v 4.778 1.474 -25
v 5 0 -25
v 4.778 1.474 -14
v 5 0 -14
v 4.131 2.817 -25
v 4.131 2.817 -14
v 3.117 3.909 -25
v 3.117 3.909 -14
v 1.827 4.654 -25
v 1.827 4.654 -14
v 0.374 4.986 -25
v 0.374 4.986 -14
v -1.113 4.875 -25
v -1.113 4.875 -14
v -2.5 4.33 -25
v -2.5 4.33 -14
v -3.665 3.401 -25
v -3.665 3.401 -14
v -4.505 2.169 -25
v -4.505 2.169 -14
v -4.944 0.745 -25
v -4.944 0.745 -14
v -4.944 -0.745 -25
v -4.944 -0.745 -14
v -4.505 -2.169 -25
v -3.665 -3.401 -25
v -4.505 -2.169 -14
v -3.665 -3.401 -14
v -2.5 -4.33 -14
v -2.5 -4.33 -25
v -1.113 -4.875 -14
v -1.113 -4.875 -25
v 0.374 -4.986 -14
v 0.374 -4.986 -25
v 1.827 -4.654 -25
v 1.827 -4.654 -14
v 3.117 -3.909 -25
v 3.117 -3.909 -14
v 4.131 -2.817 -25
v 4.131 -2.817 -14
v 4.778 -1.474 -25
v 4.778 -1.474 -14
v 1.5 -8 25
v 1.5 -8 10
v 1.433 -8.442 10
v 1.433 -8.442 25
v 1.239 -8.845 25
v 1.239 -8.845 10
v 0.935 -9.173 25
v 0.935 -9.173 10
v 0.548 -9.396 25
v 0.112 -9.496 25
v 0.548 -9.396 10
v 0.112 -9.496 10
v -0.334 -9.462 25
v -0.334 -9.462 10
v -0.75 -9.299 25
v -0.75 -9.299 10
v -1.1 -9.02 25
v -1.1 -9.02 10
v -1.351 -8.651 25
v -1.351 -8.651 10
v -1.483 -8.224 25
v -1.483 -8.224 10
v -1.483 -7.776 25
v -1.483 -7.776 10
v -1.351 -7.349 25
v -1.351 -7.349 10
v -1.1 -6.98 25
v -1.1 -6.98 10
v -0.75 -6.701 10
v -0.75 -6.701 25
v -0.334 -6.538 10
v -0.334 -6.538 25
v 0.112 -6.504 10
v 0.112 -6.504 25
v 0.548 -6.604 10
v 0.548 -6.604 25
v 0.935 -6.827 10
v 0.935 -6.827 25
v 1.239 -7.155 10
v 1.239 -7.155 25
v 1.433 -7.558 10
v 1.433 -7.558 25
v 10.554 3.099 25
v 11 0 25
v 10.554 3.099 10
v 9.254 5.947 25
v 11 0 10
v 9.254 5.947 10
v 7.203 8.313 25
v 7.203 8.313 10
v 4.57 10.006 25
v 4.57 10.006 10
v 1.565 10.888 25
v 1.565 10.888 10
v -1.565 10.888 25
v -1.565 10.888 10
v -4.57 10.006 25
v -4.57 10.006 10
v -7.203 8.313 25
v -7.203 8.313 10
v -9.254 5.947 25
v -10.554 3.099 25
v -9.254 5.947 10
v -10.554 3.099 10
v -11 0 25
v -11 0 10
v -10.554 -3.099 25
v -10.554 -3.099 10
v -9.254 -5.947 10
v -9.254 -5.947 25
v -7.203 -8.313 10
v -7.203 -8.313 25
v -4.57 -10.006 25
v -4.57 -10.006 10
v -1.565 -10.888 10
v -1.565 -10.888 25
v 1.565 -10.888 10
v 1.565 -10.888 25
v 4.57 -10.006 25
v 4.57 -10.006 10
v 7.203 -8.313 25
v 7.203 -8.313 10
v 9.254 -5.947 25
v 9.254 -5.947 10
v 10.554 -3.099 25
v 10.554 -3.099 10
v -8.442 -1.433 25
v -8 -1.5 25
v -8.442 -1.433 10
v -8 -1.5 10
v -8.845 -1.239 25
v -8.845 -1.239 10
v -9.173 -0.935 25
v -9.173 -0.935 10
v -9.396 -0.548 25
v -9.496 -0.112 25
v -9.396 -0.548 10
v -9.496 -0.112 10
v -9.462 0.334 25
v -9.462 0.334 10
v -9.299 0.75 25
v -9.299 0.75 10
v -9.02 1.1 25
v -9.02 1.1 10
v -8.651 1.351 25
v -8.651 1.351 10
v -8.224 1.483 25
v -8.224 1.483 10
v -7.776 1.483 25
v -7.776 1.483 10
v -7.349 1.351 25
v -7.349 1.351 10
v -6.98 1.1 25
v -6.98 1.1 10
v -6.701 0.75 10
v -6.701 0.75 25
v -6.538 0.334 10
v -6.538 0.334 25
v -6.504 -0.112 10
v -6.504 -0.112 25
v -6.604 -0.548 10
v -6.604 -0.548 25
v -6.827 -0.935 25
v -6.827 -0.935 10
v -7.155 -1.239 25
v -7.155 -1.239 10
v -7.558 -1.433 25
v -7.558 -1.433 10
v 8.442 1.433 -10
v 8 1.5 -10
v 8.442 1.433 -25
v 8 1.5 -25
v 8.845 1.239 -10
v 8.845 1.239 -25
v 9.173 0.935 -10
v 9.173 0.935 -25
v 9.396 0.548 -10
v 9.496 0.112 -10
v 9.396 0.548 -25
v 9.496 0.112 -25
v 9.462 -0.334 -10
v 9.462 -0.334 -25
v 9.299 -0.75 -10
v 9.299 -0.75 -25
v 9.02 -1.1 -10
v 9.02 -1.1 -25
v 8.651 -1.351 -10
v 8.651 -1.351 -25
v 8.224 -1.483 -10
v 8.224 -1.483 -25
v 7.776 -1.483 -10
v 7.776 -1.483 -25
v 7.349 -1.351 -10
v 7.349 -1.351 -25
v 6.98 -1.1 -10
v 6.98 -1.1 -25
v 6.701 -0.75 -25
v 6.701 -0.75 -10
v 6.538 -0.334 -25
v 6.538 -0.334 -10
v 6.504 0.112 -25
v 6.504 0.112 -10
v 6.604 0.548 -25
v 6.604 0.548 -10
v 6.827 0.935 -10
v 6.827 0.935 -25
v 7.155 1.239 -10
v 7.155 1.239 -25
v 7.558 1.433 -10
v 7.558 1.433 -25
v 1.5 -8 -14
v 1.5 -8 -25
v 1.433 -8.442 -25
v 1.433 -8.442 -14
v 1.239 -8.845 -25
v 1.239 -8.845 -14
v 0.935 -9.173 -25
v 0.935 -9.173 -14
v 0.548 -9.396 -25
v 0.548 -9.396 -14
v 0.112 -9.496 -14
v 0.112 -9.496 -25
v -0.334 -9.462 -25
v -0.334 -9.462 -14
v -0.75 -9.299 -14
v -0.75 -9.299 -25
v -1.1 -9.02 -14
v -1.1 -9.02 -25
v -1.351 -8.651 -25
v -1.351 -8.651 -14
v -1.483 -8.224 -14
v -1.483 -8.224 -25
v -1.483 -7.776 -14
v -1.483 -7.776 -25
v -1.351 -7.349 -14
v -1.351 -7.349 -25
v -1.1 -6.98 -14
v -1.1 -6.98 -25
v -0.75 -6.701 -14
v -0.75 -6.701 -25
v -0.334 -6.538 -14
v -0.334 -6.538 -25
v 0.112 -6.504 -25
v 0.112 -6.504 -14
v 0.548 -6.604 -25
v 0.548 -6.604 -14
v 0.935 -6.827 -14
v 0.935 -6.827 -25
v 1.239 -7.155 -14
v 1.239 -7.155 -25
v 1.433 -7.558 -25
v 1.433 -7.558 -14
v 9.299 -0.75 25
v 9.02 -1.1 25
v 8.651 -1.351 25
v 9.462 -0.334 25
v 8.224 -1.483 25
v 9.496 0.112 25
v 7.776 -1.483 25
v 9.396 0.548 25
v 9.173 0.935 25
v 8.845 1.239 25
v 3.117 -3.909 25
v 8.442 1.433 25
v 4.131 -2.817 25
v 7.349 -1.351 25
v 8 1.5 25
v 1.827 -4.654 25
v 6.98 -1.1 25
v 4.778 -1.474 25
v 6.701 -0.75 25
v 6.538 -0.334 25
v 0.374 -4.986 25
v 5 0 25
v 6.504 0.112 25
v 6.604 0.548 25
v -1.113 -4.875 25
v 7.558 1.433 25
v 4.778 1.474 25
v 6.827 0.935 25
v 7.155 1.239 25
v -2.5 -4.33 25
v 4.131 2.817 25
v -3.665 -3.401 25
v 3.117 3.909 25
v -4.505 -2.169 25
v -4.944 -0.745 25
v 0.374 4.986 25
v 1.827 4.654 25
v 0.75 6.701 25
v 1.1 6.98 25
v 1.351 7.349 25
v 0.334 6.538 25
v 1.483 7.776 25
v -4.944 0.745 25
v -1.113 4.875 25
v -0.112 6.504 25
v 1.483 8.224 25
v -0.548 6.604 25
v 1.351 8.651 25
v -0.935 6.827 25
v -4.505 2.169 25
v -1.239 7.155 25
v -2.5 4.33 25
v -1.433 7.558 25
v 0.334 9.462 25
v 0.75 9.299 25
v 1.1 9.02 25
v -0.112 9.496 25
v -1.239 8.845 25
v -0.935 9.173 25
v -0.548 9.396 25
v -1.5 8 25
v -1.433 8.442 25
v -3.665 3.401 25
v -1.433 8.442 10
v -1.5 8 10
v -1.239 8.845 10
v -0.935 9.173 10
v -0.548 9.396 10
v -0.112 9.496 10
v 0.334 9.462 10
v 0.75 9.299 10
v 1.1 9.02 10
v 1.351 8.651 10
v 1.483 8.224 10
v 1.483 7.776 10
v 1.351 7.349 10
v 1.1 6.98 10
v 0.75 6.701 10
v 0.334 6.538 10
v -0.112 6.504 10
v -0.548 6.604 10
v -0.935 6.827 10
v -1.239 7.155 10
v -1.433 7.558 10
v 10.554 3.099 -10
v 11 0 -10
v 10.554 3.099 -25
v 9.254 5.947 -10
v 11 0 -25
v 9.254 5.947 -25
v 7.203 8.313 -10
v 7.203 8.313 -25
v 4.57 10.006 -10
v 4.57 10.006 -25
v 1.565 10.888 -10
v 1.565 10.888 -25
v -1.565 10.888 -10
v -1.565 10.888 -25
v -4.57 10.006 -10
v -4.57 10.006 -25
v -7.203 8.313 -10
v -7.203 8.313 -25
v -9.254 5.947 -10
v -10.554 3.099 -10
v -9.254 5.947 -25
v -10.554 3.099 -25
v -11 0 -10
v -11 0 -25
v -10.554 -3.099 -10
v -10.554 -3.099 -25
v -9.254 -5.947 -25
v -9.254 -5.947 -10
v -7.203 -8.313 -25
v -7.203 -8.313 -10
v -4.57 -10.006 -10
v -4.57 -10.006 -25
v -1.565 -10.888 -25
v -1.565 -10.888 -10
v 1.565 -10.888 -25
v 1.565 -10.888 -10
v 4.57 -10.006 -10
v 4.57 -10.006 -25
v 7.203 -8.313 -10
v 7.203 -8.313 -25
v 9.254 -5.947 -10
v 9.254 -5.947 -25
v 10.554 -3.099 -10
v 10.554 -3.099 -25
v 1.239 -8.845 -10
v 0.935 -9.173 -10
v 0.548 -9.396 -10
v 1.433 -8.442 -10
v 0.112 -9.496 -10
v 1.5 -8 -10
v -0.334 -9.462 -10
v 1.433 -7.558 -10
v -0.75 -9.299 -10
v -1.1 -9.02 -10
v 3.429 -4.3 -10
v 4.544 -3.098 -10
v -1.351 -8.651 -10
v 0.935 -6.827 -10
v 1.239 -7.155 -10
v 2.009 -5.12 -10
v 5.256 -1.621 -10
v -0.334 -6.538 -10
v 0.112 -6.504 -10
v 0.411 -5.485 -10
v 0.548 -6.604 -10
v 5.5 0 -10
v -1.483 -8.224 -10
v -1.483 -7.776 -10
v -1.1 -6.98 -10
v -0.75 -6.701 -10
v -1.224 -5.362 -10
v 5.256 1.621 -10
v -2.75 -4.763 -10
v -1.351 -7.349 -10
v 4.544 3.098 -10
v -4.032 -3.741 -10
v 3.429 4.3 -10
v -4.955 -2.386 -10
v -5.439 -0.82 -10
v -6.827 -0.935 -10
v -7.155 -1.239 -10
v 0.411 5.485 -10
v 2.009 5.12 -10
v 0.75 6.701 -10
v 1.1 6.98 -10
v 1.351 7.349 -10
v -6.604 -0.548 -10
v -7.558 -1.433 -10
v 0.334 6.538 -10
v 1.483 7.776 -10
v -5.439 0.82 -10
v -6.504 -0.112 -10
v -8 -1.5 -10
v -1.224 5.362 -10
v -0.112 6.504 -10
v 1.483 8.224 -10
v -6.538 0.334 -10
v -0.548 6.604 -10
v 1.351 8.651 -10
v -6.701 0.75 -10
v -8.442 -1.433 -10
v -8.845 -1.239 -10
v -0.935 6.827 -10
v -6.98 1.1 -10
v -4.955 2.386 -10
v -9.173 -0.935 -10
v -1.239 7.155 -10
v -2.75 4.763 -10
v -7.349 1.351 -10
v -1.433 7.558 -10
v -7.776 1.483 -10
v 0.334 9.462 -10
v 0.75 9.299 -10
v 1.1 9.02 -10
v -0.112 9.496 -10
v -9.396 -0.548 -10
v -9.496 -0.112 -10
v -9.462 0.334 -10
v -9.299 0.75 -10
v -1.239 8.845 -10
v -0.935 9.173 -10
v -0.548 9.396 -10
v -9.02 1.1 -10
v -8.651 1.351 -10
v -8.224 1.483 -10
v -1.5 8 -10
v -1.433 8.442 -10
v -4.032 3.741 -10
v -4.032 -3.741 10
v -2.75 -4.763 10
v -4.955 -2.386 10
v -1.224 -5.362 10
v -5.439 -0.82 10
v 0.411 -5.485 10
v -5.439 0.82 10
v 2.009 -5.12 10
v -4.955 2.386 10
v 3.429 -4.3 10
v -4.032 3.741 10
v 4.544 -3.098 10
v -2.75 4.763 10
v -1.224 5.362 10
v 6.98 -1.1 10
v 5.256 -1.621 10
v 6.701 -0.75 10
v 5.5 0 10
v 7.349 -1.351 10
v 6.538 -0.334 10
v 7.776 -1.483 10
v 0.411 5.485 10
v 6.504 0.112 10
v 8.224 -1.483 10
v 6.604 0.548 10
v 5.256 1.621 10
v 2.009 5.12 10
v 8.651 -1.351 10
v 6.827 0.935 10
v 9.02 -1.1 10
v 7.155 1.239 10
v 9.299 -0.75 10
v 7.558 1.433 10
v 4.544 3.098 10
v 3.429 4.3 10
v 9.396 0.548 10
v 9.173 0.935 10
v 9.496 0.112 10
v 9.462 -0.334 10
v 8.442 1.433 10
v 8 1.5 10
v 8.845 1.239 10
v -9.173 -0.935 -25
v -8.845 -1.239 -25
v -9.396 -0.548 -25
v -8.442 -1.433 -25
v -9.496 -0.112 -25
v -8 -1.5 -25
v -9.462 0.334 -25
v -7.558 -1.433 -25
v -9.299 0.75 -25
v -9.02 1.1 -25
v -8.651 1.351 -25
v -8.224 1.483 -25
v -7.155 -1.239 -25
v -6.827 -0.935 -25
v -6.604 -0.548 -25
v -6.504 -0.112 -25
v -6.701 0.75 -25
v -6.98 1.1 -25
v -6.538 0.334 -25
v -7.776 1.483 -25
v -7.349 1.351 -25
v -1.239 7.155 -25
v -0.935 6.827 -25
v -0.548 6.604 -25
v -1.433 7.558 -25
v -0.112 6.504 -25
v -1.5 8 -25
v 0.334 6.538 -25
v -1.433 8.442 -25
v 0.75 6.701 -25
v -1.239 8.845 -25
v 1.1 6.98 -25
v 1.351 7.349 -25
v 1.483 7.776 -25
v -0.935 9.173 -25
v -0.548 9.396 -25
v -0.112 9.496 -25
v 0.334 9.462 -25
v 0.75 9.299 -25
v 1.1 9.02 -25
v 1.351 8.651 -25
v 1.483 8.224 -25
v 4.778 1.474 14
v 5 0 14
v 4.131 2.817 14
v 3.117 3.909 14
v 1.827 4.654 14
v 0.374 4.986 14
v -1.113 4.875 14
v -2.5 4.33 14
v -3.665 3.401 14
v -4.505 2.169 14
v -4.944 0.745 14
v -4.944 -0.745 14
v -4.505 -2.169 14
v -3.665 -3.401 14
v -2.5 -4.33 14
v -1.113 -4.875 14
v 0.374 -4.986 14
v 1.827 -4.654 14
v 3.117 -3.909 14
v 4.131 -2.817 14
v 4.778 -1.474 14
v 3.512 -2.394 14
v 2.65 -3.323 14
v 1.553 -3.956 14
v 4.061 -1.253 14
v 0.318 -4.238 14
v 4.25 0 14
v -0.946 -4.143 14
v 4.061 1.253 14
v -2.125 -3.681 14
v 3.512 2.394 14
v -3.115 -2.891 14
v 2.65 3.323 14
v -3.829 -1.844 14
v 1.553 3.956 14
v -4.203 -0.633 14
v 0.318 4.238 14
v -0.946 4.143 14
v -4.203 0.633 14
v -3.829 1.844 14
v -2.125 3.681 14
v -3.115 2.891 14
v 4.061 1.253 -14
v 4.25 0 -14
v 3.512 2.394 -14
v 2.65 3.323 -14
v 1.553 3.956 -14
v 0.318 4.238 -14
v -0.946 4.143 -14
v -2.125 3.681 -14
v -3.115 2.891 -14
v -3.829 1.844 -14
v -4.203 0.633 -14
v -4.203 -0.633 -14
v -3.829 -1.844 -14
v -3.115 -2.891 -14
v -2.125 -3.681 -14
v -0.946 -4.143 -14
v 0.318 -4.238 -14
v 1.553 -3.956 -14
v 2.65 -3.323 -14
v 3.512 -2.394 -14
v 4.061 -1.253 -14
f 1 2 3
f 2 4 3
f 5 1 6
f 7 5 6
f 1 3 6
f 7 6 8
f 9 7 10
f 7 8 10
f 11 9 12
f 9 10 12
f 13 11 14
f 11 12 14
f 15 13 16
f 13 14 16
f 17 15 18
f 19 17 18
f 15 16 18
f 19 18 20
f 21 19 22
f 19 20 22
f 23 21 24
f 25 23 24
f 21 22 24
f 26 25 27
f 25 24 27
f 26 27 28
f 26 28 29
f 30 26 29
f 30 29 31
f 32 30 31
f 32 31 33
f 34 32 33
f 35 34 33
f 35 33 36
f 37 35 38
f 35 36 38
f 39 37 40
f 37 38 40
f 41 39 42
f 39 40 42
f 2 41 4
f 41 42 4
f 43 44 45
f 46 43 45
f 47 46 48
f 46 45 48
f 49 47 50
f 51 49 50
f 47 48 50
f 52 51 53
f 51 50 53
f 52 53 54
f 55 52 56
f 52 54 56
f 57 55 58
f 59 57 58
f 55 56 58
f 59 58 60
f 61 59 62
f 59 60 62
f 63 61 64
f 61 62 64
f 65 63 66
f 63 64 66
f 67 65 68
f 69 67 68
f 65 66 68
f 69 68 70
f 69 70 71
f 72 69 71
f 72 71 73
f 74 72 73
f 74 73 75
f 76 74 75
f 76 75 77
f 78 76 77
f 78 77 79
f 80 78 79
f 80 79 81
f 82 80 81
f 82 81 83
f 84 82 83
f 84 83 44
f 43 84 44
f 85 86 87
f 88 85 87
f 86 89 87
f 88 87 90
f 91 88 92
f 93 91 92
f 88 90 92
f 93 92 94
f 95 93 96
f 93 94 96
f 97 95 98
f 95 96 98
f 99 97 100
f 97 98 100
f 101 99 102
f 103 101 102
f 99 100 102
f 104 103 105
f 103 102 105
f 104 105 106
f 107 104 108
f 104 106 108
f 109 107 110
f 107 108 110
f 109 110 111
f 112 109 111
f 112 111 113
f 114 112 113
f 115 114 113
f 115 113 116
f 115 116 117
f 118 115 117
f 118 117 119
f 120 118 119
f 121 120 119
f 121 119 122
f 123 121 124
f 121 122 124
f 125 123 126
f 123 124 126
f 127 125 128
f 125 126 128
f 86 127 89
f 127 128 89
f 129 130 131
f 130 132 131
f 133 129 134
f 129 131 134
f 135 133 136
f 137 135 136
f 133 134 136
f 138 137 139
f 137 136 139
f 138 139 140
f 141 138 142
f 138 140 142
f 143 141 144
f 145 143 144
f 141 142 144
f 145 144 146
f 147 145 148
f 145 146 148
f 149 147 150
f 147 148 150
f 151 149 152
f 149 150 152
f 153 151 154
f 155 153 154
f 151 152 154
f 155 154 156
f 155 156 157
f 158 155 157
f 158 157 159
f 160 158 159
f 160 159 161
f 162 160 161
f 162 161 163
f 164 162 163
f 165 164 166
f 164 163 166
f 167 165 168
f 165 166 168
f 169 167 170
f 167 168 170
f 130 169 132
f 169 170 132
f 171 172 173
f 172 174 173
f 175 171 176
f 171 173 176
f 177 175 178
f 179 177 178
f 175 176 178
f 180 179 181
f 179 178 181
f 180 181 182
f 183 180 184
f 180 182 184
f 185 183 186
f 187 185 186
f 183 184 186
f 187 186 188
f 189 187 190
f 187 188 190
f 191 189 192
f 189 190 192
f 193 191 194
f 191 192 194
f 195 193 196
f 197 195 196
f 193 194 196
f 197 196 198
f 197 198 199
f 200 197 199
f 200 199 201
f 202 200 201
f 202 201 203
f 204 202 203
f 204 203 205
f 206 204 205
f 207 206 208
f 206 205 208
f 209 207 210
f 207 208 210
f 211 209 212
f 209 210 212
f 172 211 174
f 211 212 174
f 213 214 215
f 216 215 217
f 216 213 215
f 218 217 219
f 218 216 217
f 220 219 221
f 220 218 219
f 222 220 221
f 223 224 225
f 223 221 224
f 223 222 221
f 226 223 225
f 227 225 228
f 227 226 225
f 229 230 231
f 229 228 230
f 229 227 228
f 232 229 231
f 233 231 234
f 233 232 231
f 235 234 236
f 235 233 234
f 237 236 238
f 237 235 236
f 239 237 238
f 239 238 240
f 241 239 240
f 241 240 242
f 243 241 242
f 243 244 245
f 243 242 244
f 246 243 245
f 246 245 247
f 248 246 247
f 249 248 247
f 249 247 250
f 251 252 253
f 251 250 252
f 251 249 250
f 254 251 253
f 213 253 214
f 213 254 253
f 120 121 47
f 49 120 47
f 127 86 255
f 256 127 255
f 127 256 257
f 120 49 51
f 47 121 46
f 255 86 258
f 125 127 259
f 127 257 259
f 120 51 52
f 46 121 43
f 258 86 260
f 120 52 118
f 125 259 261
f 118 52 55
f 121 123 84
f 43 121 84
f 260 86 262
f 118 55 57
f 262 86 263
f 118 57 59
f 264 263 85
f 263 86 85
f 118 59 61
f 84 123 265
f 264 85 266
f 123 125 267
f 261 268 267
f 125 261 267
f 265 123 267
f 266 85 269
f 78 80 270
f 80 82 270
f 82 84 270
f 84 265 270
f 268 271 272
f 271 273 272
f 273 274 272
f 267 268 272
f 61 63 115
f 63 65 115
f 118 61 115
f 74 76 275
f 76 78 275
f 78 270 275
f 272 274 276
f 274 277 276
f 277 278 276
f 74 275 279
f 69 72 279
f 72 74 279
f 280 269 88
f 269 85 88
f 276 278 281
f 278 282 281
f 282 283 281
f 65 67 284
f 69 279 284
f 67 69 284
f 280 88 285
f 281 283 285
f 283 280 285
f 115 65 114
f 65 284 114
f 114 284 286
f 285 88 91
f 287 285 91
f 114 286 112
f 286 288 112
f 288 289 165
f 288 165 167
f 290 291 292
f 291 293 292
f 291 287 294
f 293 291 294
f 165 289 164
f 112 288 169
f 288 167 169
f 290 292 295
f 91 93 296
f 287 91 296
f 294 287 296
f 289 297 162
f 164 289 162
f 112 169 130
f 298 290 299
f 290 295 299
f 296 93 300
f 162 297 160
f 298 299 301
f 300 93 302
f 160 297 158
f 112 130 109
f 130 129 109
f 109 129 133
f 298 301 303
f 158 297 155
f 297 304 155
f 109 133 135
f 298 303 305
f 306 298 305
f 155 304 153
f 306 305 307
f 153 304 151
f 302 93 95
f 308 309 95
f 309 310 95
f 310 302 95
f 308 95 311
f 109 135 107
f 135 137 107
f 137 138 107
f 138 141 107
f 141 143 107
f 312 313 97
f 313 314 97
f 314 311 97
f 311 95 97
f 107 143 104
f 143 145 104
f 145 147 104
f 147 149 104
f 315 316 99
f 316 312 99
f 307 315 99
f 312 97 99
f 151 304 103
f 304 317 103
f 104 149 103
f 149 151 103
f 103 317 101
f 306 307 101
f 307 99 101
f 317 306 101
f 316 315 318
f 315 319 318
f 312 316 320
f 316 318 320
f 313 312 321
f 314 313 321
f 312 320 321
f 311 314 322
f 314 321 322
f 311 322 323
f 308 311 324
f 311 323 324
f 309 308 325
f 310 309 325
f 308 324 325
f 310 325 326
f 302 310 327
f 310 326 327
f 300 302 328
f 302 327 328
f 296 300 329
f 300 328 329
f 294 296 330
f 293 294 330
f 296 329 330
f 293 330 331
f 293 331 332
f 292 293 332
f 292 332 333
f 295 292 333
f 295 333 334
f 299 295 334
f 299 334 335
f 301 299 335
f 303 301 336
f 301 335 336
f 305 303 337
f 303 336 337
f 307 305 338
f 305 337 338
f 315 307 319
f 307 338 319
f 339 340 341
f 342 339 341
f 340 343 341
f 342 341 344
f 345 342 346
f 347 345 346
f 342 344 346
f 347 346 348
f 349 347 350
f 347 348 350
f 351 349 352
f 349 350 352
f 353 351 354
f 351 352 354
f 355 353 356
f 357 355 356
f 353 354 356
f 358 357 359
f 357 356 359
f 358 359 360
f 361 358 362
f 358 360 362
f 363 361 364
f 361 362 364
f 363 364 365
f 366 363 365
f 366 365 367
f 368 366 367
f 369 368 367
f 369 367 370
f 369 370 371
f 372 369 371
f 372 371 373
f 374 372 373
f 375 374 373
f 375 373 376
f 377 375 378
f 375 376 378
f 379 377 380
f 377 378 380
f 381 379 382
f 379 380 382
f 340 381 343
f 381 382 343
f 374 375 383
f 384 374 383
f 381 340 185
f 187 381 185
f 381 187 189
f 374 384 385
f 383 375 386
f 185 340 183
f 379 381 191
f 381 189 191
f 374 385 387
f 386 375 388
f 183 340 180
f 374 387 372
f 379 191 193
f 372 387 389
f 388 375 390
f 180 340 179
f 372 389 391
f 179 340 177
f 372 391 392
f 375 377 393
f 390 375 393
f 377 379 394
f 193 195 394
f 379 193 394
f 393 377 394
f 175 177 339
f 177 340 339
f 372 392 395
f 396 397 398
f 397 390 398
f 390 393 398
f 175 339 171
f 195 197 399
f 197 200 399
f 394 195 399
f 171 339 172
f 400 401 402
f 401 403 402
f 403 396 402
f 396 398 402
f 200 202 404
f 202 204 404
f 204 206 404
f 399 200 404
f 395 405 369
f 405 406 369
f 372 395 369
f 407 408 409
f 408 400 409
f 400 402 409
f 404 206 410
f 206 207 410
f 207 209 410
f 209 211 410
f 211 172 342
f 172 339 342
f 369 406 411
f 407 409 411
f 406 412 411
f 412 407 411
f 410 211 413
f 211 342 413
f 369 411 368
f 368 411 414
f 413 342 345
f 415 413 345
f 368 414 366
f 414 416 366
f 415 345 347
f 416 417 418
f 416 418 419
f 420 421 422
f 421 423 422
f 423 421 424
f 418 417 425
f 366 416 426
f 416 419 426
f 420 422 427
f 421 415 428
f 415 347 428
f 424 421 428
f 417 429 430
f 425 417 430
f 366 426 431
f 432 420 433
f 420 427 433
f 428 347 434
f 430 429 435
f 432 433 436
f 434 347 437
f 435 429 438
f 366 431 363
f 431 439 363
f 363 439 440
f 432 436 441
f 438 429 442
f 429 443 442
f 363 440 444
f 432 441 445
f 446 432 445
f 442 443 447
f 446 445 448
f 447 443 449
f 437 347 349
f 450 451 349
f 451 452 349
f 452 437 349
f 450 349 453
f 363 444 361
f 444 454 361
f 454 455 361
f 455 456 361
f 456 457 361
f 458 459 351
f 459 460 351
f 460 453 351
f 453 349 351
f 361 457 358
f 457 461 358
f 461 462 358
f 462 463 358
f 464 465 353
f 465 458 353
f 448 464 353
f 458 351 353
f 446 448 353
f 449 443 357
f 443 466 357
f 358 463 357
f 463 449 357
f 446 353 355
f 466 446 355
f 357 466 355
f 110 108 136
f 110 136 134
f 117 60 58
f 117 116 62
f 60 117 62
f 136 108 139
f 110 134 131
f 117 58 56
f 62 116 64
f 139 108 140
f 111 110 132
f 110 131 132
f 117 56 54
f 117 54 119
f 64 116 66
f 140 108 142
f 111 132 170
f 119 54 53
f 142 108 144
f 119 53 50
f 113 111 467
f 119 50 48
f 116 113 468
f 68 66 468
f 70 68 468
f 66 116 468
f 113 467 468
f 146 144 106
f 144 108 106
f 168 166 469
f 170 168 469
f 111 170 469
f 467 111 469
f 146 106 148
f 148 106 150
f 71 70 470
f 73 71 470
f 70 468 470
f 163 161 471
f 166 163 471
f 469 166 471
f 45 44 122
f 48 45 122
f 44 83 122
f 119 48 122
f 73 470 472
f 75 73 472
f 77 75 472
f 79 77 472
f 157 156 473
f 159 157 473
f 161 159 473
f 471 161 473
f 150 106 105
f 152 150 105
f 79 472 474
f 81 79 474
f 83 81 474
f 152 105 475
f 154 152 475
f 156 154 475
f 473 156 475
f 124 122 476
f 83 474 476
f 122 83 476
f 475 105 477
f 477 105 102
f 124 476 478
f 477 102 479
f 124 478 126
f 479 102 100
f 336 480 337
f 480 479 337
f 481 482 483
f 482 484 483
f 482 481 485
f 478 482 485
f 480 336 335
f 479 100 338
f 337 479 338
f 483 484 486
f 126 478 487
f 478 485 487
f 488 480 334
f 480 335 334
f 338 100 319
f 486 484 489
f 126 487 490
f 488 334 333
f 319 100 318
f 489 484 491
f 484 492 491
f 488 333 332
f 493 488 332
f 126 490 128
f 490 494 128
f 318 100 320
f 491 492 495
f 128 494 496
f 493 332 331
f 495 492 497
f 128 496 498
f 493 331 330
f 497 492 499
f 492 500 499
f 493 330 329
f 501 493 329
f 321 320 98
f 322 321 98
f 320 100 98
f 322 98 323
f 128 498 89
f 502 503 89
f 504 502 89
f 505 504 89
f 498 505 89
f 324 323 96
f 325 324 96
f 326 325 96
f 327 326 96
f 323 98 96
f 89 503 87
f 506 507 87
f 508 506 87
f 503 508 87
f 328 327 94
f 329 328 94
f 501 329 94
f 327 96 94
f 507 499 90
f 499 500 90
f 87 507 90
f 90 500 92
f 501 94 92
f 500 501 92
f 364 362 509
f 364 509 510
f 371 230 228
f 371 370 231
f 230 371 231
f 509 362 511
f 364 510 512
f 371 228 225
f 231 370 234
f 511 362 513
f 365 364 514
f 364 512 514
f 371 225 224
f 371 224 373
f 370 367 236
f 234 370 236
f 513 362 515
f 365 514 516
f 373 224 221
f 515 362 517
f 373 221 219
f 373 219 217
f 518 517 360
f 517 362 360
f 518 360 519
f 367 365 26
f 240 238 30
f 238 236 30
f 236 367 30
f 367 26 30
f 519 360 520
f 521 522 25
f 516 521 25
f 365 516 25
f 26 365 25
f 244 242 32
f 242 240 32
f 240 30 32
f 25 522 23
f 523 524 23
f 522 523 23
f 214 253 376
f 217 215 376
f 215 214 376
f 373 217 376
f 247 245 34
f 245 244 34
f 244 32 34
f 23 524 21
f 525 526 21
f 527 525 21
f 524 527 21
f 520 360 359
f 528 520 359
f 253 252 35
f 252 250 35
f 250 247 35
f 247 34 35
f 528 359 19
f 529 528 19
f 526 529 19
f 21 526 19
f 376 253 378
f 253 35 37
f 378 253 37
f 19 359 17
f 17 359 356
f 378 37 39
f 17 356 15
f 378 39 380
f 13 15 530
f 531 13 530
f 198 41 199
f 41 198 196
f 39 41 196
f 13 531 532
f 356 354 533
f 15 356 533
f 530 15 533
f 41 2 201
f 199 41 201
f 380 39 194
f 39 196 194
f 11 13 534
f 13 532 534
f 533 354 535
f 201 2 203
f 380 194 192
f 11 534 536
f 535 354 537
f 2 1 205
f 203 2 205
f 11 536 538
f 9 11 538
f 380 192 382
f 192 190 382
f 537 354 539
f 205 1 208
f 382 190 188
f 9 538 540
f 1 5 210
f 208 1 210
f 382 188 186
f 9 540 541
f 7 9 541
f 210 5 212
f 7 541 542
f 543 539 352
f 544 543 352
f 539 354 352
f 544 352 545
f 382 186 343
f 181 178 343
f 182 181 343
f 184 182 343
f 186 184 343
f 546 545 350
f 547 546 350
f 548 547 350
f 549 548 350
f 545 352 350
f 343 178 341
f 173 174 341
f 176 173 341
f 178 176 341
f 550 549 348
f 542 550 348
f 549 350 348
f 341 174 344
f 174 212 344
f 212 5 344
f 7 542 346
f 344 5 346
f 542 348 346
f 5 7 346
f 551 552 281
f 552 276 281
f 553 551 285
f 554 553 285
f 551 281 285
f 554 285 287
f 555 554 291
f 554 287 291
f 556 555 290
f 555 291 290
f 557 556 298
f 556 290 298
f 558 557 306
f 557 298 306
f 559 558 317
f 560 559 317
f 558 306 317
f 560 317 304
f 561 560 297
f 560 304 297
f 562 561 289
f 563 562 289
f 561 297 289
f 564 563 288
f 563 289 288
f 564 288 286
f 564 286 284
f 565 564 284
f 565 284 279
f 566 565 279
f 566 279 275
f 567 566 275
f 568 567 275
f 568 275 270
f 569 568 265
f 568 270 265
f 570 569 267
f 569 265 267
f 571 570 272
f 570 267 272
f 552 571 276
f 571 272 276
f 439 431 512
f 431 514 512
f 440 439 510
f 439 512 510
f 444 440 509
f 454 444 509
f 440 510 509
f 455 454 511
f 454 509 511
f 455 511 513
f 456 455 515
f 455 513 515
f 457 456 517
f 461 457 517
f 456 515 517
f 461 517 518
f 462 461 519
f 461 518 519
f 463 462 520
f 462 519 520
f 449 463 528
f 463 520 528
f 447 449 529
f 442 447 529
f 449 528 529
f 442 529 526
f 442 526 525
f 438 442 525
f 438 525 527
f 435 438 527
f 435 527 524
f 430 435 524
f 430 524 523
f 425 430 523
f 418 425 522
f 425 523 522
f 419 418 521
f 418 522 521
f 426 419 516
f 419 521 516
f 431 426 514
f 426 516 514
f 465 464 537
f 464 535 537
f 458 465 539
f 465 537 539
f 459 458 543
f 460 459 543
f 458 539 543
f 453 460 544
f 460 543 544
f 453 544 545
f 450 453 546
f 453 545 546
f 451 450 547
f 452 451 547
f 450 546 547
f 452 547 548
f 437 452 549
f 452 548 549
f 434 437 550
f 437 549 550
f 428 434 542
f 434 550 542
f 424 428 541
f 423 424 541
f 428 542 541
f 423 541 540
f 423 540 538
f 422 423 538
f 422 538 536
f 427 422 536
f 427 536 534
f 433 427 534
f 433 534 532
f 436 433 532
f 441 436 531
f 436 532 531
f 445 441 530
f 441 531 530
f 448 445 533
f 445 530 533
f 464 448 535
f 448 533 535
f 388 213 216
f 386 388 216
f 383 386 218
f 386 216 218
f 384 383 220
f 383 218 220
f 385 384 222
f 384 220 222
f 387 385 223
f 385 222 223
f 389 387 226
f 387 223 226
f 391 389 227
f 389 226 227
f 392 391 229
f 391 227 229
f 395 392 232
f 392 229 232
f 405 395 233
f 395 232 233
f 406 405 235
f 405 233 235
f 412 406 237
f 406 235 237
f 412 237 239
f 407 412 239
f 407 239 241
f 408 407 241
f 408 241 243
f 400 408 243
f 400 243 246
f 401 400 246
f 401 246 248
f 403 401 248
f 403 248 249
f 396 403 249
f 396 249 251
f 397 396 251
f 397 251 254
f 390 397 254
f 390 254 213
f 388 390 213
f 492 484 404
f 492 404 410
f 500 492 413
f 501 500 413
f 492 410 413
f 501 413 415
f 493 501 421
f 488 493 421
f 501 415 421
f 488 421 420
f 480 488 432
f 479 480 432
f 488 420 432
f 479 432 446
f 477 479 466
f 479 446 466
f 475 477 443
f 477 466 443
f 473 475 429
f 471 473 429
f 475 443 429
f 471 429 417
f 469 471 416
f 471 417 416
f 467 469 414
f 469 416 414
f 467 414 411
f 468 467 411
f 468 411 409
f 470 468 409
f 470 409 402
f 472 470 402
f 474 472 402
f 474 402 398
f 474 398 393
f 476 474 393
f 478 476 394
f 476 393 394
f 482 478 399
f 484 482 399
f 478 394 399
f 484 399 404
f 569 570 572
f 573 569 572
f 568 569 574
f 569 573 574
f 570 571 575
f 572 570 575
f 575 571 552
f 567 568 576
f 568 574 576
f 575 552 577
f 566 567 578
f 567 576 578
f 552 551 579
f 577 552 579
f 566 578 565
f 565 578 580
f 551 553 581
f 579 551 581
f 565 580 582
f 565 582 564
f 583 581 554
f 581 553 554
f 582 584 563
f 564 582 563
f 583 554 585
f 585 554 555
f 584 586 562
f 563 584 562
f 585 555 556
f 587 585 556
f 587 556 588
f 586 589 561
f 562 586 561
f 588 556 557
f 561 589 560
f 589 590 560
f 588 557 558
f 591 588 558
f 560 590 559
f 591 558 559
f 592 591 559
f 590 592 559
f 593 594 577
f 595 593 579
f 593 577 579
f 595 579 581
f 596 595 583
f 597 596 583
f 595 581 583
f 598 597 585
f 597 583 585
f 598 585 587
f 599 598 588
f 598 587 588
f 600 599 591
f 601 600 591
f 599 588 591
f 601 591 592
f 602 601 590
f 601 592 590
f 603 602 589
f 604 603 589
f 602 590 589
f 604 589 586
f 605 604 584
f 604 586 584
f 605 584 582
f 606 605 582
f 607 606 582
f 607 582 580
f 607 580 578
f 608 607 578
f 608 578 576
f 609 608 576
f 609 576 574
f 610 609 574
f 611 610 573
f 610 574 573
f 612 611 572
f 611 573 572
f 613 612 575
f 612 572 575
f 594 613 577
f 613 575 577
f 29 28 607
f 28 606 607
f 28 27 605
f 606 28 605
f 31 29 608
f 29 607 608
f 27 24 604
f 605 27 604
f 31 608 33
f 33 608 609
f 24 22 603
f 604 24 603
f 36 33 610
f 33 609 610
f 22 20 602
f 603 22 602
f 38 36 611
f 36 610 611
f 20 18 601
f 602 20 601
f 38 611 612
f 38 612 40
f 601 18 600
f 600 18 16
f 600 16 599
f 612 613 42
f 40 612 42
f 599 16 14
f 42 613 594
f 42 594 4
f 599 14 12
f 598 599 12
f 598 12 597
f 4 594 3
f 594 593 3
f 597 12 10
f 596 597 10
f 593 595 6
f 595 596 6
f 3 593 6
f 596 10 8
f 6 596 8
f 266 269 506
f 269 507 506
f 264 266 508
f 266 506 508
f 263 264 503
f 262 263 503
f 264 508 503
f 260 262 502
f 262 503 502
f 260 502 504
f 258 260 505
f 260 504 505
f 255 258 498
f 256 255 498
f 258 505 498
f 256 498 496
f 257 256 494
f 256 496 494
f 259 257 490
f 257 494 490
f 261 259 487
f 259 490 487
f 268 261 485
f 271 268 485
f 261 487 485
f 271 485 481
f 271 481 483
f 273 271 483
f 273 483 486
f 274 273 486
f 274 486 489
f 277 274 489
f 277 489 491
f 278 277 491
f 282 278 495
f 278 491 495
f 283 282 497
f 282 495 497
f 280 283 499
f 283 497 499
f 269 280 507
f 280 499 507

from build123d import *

# Parameters (mm, degrees)
SKETCH001_R        = 1.5
POCKET_DEPTH       = 156.780455
POCKET_DEPTH_BACK  = 128.780455
POLARPATTERN_COUNT = 4


with BuildPart() as part:
    # Sketch → Revolution (revolve)
    with BuildSketch(Plane.XZ):
        Polygon((5, -25), (5, -14), (4.25, -14), (4.25, 14), (5, 14), (5, 25), (11, 25), (11, 10), (5.5, 10), (5.5, -10), (11, -10), (11, -25), align=None)
    revolve(axis=Axis((0, 0, 0), (0, 0, 1)))

    # Sketch001 (on Face2 of Revolution) → Pocket (cut, two sides)
    with BuildSketch(Plane(origin=(0, 0, -14), x_dir=(1, 0, 0), z_dir=(0, 0, -1))) as pocket_sk:
        with Locations((0, 8)):
            Circle(SKETCH001_R)
    pocket = extrude(amount=-POCKET_DEPTH, mode=Mode.SUBTRACT) + extrude(pocket_sk.sketch, amount=POCKET_DEPTH_BACK, mode=Mode.SUBTRACT)

    # PolarPattern: Pocket ×4 about axis
    polarpattern_axis = Axis((0, 0, -14), (0, 0, -1))
    for i in range(1, POLARPATTERN_COUNT):
        add(pocket.rotate(polarpattern_axis, i * 360 / POLARPATTERN_COUNT), mode=Mode.SUBTRACT)


solid = part.part
